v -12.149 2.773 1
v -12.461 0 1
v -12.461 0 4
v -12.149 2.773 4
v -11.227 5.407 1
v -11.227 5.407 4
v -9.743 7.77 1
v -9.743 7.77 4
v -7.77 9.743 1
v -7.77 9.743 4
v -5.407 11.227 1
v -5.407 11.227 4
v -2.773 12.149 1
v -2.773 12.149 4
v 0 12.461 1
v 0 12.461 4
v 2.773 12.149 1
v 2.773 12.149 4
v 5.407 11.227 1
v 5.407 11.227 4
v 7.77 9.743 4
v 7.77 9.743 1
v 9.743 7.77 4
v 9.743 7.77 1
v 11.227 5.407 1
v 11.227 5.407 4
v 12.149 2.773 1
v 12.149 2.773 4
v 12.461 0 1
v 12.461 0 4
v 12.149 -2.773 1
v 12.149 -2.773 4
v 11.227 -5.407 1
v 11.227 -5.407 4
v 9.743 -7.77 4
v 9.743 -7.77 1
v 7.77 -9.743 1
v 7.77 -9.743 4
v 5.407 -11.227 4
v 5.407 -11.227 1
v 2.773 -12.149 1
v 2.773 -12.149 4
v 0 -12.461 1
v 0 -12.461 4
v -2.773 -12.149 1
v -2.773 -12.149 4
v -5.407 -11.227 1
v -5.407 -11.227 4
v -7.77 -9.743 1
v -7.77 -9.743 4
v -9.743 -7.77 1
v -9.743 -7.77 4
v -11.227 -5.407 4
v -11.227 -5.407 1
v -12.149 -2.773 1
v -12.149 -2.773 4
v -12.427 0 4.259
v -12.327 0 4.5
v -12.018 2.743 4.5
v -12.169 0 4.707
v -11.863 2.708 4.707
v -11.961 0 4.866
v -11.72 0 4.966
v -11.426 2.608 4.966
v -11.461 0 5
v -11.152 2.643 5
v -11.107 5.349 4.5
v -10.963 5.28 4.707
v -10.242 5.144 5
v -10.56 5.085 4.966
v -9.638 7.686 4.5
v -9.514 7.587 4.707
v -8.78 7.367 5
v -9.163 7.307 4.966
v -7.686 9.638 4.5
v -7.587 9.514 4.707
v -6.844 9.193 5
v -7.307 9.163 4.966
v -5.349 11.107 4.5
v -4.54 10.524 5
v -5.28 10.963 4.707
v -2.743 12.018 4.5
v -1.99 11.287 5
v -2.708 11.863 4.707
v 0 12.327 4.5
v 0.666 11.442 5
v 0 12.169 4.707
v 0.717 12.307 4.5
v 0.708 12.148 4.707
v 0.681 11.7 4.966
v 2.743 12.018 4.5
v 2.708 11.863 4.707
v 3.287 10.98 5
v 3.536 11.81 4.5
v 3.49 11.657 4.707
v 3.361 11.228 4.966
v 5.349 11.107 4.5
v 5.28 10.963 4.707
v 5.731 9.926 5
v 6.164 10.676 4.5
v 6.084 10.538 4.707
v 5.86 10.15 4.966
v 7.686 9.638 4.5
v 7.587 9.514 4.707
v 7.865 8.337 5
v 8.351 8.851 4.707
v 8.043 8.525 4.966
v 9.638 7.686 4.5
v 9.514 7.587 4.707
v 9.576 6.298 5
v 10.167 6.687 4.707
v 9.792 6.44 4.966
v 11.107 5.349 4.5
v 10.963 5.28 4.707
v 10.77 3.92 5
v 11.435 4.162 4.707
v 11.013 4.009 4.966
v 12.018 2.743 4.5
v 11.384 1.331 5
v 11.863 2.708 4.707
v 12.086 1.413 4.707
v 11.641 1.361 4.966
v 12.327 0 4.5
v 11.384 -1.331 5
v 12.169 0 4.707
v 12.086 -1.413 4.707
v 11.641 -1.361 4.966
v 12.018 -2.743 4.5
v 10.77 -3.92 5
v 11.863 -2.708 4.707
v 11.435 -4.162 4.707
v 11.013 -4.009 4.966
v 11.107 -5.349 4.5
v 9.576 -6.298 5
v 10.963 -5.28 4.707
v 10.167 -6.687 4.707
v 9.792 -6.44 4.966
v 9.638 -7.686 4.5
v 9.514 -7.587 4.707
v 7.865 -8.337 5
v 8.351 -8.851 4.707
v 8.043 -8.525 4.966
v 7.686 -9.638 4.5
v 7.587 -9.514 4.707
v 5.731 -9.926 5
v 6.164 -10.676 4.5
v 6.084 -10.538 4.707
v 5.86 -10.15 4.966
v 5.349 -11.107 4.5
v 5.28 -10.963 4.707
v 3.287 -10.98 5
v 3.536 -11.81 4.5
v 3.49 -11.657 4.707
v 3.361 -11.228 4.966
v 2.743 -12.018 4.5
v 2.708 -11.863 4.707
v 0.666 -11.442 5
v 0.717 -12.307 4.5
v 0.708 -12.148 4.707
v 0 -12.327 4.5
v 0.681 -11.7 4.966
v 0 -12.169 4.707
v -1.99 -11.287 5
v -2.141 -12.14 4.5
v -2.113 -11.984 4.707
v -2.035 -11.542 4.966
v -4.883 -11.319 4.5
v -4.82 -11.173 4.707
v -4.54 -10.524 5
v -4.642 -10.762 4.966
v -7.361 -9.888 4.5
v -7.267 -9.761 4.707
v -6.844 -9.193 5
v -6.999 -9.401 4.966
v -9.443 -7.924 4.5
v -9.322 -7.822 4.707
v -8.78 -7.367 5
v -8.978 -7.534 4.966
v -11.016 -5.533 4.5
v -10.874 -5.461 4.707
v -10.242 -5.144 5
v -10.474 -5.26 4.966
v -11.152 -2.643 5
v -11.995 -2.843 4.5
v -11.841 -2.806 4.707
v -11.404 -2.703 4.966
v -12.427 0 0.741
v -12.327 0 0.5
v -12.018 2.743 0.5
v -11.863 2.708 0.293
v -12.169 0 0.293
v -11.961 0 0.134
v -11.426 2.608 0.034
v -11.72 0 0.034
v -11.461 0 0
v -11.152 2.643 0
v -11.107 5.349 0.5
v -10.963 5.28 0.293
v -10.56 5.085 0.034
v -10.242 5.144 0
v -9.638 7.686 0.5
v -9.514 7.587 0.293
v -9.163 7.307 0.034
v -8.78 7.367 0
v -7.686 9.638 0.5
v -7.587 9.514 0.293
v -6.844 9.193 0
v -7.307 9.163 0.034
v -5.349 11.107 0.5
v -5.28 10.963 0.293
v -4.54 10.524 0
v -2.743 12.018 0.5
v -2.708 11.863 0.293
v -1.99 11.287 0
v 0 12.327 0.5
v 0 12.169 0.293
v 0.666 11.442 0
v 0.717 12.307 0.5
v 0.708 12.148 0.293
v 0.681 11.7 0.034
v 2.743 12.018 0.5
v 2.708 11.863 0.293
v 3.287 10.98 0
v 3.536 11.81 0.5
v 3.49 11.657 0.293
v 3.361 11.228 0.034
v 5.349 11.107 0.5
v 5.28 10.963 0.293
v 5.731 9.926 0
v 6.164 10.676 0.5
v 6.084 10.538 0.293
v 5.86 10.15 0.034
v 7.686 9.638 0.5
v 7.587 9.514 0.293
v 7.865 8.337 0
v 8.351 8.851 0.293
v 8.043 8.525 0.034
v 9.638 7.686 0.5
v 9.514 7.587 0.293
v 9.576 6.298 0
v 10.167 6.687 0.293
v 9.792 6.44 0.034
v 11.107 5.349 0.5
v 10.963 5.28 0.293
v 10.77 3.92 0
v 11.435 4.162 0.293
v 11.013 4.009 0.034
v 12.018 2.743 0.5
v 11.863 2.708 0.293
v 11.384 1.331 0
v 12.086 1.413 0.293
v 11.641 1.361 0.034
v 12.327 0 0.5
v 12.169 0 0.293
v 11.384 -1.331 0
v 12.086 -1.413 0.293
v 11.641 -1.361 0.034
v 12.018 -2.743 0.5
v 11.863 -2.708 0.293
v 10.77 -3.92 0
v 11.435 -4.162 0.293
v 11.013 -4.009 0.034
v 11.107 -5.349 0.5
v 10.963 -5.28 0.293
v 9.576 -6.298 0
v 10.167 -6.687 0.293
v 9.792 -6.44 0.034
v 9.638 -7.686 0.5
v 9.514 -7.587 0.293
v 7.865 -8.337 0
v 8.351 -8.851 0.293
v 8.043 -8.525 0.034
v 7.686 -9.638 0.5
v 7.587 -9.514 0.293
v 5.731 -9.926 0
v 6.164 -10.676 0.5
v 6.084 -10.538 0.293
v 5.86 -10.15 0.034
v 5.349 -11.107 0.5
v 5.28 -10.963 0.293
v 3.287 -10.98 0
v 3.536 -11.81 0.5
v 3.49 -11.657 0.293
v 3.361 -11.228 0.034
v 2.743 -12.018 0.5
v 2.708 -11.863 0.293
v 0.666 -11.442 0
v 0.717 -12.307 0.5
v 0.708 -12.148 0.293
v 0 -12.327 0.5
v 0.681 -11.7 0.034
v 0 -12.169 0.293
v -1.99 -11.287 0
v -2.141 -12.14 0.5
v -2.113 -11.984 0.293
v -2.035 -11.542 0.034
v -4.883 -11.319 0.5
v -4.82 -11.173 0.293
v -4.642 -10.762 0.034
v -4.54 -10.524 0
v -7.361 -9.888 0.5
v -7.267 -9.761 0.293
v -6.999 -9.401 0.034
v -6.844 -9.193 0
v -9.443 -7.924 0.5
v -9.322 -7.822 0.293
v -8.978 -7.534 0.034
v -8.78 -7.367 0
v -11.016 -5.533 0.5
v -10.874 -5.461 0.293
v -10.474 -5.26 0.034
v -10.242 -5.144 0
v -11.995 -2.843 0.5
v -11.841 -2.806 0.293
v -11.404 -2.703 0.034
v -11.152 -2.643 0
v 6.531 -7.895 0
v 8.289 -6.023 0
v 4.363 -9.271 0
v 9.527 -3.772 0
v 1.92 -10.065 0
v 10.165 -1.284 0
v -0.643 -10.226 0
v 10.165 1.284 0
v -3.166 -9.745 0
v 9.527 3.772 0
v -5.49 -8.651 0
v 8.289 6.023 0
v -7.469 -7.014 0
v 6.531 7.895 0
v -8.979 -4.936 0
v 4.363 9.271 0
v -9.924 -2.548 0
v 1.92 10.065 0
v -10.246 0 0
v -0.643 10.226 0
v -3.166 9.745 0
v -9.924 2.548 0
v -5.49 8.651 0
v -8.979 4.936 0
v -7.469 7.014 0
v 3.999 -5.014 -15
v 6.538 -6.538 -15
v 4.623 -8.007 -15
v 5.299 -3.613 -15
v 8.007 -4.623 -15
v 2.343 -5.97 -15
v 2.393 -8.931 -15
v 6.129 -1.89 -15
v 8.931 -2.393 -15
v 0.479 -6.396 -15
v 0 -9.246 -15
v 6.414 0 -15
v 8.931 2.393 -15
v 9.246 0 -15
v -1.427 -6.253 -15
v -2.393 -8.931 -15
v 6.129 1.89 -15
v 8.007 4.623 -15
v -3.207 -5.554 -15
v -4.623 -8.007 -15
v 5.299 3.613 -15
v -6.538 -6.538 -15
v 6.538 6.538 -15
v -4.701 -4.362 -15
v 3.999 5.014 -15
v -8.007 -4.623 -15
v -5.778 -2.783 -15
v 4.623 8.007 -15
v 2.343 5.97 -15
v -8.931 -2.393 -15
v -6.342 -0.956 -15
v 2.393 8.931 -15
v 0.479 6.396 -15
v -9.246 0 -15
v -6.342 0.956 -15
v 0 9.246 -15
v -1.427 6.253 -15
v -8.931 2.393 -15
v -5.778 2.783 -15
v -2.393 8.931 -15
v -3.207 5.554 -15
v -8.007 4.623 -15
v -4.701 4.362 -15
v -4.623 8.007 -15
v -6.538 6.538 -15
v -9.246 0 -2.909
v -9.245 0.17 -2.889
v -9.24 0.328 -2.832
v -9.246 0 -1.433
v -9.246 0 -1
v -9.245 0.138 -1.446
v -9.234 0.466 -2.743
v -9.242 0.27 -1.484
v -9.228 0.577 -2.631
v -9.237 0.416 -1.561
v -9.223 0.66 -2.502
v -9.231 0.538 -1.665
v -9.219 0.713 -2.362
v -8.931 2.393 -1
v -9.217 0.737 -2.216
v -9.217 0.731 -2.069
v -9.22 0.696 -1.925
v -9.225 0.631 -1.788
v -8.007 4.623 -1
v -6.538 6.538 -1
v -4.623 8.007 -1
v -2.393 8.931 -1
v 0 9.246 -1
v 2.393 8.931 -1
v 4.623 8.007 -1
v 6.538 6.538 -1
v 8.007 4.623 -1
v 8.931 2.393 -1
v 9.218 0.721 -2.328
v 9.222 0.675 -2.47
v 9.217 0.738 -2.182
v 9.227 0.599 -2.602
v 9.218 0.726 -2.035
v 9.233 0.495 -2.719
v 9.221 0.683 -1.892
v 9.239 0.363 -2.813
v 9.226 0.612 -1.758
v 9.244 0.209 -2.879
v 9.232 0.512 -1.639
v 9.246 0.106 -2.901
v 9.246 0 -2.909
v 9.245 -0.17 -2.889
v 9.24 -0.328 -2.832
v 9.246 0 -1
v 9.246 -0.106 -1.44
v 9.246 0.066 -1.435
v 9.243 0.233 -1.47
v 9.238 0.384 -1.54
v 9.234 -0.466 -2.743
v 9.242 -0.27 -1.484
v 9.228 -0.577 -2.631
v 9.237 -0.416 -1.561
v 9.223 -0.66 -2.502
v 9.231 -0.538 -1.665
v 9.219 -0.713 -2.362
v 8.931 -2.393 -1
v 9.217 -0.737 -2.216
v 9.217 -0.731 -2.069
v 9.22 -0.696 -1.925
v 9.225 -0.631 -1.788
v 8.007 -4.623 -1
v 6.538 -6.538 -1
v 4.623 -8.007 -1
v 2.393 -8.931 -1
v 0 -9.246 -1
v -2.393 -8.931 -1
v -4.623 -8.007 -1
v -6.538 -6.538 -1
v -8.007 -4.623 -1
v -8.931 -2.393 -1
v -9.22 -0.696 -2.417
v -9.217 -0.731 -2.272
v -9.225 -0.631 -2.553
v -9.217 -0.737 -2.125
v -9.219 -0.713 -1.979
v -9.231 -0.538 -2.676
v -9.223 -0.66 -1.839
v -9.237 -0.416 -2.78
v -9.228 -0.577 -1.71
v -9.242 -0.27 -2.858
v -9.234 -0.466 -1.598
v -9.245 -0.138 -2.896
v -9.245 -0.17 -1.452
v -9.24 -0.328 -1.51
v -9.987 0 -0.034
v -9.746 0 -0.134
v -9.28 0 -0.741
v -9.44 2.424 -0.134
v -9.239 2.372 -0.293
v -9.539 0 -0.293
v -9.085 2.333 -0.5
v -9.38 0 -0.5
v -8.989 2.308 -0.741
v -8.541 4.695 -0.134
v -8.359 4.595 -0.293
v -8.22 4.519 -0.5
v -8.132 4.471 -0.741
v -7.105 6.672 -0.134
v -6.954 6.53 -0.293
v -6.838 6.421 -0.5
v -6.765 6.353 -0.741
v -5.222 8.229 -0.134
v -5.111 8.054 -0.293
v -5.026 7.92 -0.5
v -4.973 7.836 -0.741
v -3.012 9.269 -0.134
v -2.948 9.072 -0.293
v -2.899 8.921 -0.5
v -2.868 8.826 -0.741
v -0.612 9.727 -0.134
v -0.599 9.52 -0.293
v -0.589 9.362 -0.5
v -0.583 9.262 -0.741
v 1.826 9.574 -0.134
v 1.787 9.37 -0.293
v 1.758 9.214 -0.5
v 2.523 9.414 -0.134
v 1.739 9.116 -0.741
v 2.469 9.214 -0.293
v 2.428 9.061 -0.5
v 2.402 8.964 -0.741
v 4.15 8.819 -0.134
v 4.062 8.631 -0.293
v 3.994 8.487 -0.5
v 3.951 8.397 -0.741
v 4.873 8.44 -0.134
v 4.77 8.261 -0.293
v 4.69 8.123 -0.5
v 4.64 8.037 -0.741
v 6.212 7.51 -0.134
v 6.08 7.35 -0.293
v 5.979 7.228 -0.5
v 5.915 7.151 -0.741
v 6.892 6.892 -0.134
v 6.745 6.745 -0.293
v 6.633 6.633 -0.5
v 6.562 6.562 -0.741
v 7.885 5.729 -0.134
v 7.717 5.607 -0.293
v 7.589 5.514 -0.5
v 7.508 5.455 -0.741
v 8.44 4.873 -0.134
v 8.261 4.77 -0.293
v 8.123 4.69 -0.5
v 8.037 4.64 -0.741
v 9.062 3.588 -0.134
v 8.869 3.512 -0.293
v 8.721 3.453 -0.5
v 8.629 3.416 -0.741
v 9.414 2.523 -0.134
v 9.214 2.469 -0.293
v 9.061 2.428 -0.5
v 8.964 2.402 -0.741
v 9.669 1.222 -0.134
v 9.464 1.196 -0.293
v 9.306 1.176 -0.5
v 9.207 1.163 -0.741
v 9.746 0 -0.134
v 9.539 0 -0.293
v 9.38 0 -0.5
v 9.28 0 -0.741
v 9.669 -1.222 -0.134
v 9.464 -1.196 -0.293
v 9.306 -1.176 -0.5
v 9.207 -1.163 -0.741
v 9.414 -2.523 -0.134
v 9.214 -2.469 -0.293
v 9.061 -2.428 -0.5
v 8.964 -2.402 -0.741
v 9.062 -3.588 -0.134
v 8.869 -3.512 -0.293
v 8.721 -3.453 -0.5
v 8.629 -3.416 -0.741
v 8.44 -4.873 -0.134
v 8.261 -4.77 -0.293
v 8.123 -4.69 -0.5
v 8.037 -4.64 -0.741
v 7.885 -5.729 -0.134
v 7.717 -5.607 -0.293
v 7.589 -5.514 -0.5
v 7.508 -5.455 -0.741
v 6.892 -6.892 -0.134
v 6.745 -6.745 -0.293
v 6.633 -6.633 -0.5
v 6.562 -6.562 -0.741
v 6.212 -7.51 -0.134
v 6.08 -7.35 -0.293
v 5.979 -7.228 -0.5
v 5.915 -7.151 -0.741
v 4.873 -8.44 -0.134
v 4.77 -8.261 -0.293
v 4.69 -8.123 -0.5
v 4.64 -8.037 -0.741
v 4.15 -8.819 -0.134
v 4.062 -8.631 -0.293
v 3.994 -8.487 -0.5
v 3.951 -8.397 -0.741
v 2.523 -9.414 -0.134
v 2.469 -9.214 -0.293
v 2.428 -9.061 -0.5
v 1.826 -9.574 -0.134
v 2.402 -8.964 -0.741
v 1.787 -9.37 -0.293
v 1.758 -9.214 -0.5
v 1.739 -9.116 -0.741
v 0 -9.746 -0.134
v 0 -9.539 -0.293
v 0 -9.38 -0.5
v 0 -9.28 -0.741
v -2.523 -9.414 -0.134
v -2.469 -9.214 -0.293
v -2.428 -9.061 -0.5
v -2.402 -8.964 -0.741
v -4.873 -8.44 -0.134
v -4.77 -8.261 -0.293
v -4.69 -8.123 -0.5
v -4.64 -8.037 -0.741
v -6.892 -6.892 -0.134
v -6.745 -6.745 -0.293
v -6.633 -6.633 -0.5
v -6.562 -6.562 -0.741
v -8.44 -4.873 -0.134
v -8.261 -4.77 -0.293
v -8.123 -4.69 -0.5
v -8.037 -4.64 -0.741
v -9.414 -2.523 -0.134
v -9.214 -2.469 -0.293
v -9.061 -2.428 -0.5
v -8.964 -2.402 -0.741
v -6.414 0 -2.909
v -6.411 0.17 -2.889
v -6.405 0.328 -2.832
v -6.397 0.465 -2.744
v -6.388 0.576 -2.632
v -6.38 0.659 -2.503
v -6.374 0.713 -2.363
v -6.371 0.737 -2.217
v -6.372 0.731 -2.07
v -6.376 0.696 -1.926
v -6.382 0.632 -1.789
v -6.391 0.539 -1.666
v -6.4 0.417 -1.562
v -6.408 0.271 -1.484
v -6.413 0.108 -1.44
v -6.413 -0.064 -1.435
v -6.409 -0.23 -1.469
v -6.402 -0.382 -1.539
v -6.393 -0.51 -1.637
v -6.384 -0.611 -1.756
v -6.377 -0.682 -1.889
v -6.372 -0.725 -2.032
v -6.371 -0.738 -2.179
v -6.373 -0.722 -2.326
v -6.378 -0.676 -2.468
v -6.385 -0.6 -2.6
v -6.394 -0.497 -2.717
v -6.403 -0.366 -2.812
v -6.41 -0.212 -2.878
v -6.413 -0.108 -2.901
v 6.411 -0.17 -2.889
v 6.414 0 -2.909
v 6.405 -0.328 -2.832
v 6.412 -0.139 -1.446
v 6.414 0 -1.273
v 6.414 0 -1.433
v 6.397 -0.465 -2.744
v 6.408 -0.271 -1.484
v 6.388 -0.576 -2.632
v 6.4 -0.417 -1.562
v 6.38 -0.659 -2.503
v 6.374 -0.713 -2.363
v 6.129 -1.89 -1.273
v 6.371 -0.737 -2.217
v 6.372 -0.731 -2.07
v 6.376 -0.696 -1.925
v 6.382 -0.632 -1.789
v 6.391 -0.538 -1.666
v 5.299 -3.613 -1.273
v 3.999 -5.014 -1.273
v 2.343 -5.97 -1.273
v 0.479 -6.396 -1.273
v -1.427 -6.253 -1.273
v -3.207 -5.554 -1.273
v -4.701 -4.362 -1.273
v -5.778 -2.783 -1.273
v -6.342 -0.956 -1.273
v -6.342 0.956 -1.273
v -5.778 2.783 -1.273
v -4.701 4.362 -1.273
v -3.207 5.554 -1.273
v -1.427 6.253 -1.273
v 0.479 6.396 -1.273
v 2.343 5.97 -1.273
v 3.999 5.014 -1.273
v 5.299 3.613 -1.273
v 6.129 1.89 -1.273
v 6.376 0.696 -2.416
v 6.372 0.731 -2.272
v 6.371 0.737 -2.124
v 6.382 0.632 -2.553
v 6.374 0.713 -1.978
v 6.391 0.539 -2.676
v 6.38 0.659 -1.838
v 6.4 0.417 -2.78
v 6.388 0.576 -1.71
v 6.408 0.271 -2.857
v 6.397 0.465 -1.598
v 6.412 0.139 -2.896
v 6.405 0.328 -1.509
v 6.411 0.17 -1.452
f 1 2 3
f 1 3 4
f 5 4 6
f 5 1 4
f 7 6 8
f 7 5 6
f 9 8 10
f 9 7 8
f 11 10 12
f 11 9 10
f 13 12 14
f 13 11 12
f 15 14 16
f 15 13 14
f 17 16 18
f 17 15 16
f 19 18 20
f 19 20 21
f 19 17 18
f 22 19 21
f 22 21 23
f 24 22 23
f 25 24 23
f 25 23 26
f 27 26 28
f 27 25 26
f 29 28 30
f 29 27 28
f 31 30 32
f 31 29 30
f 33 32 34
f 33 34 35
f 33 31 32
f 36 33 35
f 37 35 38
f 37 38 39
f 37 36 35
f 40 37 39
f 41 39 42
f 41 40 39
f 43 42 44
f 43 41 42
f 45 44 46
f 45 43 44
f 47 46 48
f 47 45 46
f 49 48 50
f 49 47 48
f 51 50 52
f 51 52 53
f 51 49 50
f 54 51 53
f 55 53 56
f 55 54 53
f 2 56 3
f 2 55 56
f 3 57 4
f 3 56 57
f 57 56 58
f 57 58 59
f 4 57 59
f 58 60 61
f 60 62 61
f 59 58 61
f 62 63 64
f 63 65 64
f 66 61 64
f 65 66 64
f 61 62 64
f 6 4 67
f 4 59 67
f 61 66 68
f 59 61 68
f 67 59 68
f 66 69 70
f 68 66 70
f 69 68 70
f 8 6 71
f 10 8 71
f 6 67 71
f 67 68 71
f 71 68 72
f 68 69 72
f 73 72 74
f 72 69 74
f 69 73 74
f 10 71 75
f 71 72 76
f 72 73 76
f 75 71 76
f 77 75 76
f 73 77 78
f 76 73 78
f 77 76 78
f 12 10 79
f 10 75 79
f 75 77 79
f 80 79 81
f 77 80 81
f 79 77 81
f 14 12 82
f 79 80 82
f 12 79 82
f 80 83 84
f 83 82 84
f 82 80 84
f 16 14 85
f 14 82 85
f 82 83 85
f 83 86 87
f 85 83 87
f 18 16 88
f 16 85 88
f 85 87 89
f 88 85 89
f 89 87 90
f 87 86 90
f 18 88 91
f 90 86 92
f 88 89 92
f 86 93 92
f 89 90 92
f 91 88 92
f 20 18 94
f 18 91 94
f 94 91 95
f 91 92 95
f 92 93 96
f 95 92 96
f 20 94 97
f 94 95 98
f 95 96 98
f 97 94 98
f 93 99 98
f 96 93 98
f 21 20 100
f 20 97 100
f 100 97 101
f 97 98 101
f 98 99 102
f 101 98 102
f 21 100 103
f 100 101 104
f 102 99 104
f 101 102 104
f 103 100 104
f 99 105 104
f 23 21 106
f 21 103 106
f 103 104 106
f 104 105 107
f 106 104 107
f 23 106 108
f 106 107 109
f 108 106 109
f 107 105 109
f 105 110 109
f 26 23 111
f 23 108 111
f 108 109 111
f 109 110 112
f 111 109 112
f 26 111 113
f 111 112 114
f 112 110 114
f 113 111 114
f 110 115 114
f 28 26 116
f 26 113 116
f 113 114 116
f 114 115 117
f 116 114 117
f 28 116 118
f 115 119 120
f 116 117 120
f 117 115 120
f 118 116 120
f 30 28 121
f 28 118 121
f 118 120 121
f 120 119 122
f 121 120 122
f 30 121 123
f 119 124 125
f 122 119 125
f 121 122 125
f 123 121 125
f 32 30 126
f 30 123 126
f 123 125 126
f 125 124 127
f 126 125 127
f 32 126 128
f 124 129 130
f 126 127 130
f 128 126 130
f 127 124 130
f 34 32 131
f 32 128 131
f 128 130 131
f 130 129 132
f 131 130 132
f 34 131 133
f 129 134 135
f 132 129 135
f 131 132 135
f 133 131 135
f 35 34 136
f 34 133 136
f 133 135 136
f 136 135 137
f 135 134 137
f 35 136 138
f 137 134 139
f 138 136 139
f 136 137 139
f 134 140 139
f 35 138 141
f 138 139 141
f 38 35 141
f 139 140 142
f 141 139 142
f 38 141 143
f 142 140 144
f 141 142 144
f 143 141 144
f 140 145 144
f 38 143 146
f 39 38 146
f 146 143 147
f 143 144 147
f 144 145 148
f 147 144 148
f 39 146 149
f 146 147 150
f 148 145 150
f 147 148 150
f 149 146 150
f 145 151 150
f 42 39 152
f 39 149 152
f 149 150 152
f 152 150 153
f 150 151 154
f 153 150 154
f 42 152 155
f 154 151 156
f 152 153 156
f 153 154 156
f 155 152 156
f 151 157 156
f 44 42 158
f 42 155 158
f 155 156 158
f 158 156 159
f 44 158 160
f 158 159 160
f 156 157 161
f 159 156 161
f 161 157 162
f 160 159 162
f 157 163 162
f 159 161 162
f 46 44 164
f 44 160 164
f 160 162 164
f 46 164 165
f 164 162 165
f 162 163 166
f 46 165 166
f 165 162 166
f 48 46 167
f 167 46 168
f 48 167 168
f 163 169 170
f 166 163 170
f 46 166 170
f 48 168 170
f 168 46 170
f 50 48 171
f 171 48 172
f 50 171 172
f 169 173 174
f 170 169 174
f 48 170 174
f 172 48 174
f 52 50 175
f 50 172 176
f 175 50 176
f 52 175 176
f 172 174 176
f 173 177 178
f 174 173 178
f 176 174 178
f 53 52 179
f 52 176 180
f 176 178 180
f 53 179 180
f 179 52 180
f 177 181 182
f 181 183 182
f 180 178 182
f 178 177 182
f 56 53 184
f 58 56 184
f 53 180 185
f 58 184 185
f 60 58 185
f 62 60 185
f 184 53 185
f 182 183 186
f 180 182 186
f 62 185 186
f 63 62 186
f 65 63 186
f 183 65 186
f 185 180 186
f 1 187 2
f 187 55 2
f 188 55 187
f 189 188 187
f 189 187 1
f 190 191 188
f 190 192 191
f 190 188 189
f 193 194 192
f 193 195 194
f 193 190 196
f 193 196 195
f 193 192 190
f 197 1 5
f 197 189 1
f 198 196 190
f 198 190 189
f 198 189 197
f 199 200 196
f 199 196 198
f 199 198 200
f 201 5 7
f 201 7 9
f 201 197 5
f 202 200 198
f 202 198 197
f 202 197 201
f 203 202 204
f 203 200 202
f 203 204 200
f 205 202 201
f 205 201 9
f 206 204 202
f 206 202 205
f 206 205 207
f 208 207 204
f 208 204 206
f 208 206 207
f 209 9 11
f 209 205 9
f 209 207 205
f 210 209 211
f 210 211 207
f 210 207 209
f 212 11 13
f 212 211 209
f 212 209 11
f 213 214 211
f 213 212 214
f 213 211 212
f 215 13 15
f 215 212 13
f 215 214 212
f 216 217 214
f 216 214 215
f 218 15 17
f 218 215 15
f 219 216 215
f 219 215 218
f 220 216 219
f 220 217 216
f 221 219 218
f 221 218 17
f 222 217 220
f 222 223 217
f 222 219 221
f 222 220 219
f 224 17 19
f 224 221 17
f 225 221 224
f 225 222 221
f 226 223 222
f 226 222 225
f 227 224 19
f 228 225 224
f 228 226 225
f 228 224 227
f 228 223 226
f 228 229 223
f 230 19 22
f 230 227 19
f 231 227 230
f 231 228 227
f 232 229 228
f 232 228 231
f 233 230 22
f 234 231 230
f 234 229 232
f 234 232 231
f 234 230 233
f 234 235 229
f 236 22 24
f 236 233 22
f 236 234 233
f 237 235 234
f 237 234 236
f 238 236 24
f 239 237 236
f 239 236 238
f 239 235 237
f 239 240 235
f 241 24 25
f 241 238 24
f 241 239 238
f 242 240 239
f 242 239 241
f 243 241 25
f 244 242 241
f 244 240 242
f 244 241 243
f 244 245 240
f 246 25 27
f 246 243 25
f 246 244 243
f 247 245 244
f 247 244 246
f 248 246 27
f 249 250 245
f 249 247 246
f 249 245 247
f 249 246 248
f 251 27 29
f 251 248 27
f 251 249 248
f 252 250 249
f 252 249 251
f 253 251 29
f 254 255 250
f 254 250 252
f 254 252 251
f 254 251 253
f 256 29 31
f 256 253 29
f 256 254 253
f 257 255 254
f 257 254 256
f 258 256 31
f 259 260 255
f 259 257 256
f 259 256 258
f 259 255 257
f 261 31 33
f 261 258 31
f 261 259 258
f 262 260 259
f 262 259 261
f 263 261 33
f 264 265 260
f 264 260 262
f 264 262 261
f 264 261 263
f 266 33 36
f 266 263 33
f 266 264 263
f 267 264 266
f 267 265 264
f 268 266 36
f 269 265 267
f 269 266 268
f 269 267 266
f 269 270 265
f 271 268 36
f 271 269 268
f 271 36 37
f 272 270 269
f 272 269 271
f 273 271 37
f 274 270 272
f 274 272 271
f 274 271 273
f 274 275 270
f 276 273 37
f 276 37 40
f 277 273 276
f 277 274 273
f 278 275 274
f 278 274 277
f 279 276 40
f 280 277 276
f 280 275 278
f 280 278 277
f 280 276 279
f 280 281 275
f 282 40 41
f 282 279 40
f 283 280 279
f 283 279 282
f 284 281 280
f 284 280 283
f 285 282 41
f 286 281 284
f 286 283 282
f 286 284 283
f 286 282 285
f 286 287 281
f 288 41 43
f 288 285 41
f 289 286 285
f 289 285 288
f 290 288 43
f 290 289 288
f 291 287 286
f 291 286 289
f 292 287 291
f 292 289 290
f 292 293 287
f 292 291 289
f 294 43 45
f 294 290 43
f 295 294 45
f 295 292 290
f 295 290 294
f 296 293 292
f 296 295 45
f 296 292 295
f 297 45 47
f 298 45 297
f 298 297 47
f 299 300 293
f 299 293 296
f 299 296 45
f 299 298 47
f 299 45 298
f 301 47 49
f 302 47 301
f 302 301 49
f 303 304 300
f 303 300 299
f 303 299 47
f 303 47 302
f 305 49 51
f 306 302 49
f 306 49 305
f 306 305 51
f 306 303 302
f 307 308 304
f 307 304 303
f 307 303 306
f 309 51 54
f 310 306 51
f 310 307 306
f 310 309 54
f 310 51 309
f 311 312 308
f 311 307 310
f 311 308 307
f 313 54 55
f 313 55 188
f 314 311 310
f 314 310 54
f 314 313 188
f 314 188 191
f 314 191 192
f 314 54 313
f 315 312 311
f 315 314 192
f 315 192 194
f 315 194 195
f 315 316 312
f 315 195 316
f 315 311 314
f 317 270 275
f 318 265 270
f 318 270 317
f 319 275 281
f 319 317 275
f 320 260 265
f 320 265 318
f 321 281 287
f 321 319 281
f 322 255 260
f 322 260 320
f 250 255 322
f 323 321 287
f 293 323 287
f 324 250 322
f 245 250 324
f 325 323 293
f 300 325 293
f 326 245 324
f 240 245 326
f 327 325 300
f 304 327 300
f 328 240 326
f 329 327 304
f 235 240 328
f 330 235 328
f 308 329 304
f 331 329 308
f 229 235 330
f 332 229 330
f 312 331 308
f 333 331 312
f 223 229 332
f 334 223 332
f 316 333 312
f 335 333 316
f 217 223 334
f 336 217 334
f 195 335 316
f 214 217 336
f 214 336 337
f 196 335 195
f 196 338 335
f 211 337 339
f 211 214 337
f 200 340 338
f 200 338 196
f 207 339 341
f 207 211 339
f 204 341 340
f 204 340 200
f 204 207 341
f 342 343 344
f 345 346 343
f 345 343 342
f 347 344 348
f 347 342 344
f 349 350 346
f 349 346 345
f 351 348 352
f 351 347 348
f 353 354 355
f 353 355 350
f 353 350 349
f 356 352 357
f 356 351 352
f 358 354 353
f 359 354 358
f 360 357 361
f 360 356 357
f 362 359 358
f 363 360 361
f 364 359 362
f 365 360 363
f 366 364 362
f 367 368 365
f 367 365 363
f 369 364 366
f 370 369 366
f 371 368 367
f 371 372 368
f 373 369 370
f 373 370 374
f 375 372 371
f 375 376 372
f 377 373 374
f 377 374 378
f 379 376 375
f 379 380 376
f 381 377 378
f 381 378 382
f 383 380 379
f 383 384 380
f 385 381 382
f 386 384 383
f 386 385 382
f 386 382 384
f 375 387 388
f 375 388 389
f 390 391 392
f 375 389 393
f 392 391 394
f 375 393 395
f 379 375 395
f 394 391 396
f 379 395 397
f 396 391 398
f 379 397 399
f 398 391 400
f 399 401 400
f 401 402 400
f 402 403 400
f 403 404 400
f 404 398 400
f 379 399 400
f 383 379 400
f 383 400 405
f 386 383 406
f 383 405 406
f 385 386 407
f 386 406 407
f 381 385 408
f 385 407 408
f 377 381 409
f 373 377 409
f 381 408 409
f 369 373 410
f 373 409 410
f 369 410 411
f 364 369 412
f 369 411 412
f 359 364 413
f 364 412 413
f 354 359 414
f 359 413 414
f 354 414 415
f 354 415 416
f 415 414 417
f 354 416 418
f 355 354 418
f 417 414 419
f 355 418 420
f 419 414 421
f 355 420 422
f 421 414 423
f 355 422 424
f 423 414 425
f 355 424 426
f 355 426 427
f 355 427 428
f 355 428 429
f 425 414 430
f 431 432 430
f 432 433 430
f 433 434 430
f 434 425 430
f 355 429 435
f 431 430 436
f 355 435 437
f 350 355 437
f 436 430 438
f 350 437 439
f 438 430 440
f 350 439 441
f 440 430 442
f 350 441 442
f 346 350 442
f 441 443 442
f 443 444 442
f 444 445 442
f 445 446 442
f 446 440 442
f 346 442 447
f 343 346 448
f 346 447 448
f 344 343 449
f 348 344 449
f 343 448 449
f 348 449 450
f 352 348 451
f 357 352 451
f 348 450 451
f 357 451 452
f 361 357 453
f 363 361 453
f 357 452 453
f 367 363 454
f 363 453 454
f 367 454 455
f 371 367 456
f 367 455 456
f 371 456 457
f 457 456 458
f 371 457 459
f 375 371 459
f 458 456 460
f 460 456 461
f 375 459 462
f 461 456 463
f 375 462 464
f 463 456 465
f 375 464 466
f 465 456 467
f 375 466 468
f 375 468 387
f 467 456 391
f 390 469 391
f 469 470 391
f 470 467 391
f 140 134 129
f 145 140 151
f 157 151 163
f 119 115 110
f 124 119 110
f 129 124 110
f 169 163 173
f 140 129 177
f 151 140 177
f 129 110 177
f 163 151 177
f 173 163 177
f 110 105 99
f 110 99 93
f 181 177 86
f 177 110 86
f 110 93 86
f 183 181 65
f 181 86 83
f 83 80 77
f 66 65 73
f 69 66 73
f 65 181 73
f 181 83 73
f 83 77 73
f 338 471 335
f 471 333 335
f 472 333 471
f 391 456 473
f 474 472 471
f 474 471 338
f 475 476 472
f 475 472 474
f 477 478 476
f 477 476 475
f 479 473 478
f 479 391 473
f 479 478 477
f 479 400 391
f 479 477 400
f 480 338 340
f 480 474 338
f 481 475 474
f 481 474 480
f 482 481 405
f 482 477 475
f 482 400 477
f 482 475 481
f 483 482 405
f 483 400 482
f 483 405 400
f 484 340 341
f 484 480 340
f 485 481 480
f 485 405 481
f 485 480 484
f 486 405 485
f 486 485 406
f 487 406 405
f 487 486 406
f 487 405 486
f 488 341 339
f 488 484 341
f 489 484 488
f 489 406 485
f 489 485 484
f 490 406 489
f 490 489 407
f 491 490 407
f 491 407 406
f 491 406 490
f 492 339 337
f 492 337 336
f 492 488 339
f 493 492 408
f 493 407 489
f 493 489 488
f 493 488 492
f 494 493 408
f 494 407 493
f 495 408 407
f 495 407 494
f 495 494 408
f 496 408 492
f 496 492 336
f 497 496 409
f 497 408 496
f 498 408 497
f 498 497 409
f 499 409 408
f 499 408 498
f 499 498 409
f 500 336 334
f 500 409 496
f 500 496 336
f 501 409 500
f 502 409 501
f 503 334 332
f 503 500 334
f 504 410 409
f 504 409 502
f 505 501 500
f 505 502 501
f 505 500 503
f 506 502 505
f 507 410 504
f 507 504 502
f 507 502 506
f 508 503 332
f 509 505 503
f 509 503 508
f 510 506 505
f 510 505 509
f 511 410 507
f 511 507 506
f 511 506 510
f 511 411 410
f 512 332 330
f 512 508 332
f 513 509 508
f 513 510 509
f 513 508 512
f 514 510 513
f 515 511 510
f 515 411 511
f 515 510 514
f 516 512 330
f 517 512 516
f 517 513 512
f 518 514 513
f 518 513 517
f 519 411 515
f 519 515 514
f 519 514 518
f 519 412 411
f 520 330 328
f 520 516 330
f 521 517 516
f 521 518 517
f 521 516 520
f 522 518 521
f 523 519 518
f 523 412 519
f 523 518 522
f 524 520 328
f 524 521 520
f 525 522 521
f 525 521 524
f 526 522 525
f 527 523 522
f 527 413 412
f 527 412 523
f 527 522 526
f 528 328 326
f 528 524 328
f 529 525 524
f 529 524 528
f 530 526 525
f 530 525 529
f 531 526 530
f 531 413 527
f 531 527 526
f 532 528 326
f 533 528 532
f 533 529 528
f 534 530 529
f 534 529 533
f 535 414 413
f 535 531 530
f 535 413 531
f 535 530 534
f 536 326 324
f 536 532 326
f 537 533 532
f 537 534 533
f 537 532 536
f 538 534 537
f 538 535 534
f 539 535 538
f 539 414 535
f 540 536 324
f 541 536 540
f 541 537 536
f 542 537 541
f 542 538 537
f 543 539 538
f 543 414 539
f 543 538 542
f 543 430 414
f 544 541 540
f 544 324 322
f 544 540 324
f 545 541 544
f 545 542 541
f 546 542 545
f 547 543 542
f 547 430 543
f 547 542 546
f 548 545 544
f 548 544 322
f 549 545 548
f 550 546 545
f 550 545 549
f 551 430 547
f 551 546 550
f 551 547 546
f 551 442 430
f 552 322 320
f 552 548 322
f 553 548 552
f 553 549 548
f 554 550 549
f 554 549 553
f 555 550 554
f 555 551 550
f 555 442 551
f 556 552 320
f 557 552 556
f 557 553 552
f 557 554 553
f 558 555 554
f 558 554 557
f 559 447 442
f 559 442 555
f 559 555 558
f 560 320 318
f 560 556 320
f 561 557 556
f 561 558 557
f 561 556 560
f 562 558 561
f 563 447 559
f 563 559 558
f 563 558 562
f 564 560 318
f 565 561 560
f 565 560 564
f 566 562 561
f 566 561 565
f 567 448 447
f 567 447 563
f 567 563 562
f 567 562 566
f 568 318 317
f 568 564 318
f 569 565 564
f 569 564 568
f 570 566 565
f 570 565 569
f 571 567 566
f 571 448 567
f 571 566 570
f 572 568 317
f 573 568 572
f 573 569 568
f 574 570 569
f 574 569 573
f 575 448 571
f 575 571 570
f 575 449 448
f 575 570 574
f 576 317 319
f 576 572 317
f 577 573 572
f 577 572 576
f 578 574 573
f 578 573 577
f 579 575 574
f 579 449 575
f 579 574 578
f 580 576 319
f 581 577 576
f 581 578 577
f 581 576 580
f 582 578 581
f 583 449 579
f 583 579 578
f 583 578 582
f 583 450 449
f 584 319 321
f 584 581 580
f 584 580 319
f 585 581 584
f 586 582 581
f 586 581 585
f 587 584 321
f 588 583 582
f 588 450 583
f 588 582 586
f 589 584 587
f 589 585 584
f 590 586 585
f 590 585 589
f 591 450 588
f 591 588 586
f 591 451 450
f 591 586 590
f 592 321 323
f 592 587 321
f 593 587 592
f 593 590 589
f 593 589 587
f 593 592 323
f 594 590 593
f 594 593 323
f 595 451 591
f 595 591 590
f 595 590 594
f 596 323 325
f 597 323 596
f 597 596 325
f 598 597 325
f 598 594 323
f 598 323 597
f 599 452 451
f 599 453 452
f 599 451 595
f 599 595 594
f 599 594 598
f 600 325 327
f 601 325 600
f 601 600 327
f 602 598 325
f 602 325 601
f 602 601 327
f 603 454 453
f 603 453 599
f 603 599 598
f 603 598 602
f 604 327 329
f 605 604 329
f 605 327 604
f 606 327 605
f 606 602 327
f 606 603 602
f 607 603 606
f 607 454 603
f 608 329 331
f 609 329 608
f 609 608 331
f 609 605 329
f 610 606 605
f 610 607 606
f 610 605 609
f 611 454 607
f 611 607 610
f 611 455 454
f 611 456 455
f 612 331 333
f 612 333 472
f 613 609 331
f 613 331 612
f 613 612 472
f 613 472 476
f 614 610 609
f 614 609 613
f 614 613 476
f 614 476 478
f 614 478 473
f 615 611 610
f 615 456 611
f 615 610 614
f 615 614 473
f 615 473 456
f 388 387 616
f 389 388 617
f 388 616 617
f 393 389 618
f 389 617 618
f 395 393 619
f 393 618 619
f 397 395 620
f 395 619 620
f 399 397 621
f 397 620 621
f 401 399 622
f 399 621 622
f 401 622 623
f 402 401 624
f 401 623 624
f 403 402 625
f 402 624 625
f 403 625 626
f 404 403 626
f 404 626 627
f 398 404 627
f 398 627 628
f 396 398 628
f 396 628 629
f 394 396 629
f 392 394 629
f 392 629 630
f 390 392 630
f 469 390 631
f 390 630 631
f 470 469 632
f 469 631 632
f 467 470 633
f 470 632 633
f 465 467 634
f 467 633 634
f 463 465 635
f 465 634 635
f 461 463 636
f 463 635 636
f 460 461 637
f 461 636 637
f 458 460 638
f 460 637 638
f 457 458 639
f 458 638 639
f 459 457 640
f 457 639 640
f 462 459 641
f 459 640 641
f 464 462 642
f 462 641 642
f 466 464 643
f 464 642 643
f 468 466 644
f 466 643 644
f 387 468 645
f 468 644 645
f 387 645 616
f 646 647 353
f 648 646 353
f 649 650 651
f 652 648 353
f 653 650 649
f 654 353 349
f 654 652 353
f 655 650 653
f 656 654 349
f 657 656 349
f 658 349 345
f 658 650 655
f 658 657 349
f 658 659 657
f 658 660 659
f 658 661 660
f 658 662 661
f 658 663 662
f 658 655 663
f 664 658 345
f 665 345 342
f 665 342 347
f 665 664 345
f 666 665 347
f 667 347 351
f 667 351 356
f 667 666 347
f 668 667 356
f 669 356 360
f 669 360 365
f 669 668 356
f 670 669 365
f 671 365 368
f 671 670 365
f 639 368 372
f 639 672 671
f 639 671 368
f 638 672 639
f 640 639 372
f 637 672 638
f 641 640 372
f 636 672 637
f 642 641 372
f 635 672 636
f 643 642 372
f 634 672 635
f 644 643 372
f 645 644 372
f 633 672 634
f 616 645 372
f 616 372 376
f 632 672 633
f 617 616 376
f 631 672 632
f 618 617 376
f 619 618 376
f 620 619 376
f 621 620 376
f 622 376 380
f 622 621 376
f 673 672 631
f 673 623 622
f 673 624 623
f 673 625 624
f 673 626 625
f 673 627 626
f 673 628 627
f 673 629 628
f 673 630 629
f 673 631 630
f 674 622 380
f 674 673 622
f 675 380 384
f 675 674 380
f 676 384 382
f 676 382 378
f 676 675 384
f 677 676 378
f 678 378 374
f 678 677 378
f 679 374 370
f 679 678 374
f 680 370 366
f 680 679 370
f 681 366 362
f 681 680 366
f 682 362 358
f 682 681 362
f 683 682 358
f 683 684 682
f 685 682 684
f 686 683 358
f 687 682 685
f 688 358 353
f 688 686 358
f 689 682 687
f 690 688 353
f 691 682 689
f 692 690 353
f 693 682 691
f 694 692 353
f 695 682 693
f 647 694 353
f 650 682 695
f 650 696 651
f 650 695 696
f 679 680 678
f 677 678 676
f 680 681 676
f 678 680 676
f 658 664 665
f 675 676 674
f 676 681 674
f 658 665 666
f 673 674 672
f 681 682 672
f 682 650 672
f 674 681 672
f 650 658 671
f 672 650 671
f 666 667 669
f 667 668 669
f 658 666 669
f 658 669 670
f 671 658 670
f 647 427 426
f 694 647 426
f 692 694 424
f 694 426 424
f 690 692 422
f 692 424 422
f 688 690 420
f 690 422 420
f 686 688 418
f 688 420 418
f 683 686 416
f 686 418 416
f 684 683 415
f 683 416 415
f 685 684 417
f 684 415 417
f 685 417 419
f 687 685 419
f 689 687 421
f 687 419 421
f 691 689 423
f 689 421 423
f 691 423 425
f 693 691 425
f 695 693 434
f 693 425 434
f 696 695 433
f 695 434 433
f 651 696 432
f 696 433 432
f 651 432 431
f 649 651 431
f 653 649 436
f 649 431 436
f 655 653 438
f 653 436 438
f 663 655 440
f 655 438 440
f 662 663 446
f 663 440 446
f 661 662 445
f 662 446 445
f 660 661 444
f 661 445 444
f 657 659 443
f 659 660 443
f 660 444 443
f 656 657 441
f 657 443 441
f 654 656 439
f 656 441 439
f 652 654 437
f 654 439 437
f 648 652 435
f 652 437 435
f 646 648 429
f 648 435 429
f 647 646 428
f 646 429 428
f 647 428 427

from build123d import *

# Parameters (mm, degrees)
SKETCH1_R           = 12.461427854
BASE_EXTRUDE_DEPTH  = 5
SKETCH2_R           = 9.246210184
BOSS_EXTRUDE1_DEPTH = 15
SKETCH3_W           = 6.4135
SKETCH3_H           = 13.726679844
SKETCH4_W           = 2.875338505
SKETCH4_H           = 0.738225097
SKETCH5_W           = 2.875338506
SKETCH5_H           = 0.738225097
FILLET1_R           = 1


with BuildPart() as part:
    # Sketch1 → Base-Extrude (new body)
    with BuildSketch(Plane(origin=(0, 0, 0), x_dir=(-1, 0, 0), z_dir=(0, 0, -1))):
        Circle(SKETCH1_R)
    extrude(amount=-BASE_EXTRUDE_DEPTH)

    # Sketch2 → Boss-Extrude1 (add)
    with BuildSketch(Plane(origin=(0, 0, 0), x_dir=(-1, 0, 0), z_dir=(0, 0, -1))):
        Circle(SKETCH2_R)
    extrude(amount=BOSS_EXTRUDE1_DEPTH)

    # Sketch3 → Cut-Revolve1 (revolve, cut)
    with BuildSketch(Plane.XZ):
        with Locations((3.20675, -8.136660078)):
            Rectangle(SKETCH3_W, SKETCH3_H)
    revolve(axis=Axis((0, 0, -1.273320156), (0, 0, -1)), mode=Mode.SUBTRACT)

    # Sketch4 → Cut-Revolve2 (revolve, cut)
    with BuildSketch(Plane(origin=(0, 0, 0), x_dir=(1, 0, 0), z_dir=(0, 1, 0))):
        with Locations((-7.808540932, 2.539892603)):
            Rectangle(SKETCH4_W, SKETCH4_H)
    revolve(axis=Axis((-9.246210184, 0, -2.170780054), (1, 0, 0)), mode=Mode.SUBTRACT)

    # Sketch5 → Cut-Revolve3 (revolve, cut)
    with BuildSketch(Plane(origin=(0, 0, 0), x_dir=(1, 0, 0), z_dir=(0, 1, 0))):
        with Locations((7.808540932, 2.539892603)):
            Rectangle(SKETCH5_W, SKETCH5_H)
    revolve(axis=Axis((6.370871679, 0, -2.170780054), (1, 0, 0)), mode=Mode.SUBTRACT)

    # Fillet1
    fillet1_edges = [part.edges().sort_by_distance(p)[0] for p in [
        (12.461427854, 0, 0),
        (12.461427854, 0, 5),
        (9.246210184, 0, 0),
    ]]
    fillet(fillet1_edges, radius=FILLET1_R)


solid = part.part
